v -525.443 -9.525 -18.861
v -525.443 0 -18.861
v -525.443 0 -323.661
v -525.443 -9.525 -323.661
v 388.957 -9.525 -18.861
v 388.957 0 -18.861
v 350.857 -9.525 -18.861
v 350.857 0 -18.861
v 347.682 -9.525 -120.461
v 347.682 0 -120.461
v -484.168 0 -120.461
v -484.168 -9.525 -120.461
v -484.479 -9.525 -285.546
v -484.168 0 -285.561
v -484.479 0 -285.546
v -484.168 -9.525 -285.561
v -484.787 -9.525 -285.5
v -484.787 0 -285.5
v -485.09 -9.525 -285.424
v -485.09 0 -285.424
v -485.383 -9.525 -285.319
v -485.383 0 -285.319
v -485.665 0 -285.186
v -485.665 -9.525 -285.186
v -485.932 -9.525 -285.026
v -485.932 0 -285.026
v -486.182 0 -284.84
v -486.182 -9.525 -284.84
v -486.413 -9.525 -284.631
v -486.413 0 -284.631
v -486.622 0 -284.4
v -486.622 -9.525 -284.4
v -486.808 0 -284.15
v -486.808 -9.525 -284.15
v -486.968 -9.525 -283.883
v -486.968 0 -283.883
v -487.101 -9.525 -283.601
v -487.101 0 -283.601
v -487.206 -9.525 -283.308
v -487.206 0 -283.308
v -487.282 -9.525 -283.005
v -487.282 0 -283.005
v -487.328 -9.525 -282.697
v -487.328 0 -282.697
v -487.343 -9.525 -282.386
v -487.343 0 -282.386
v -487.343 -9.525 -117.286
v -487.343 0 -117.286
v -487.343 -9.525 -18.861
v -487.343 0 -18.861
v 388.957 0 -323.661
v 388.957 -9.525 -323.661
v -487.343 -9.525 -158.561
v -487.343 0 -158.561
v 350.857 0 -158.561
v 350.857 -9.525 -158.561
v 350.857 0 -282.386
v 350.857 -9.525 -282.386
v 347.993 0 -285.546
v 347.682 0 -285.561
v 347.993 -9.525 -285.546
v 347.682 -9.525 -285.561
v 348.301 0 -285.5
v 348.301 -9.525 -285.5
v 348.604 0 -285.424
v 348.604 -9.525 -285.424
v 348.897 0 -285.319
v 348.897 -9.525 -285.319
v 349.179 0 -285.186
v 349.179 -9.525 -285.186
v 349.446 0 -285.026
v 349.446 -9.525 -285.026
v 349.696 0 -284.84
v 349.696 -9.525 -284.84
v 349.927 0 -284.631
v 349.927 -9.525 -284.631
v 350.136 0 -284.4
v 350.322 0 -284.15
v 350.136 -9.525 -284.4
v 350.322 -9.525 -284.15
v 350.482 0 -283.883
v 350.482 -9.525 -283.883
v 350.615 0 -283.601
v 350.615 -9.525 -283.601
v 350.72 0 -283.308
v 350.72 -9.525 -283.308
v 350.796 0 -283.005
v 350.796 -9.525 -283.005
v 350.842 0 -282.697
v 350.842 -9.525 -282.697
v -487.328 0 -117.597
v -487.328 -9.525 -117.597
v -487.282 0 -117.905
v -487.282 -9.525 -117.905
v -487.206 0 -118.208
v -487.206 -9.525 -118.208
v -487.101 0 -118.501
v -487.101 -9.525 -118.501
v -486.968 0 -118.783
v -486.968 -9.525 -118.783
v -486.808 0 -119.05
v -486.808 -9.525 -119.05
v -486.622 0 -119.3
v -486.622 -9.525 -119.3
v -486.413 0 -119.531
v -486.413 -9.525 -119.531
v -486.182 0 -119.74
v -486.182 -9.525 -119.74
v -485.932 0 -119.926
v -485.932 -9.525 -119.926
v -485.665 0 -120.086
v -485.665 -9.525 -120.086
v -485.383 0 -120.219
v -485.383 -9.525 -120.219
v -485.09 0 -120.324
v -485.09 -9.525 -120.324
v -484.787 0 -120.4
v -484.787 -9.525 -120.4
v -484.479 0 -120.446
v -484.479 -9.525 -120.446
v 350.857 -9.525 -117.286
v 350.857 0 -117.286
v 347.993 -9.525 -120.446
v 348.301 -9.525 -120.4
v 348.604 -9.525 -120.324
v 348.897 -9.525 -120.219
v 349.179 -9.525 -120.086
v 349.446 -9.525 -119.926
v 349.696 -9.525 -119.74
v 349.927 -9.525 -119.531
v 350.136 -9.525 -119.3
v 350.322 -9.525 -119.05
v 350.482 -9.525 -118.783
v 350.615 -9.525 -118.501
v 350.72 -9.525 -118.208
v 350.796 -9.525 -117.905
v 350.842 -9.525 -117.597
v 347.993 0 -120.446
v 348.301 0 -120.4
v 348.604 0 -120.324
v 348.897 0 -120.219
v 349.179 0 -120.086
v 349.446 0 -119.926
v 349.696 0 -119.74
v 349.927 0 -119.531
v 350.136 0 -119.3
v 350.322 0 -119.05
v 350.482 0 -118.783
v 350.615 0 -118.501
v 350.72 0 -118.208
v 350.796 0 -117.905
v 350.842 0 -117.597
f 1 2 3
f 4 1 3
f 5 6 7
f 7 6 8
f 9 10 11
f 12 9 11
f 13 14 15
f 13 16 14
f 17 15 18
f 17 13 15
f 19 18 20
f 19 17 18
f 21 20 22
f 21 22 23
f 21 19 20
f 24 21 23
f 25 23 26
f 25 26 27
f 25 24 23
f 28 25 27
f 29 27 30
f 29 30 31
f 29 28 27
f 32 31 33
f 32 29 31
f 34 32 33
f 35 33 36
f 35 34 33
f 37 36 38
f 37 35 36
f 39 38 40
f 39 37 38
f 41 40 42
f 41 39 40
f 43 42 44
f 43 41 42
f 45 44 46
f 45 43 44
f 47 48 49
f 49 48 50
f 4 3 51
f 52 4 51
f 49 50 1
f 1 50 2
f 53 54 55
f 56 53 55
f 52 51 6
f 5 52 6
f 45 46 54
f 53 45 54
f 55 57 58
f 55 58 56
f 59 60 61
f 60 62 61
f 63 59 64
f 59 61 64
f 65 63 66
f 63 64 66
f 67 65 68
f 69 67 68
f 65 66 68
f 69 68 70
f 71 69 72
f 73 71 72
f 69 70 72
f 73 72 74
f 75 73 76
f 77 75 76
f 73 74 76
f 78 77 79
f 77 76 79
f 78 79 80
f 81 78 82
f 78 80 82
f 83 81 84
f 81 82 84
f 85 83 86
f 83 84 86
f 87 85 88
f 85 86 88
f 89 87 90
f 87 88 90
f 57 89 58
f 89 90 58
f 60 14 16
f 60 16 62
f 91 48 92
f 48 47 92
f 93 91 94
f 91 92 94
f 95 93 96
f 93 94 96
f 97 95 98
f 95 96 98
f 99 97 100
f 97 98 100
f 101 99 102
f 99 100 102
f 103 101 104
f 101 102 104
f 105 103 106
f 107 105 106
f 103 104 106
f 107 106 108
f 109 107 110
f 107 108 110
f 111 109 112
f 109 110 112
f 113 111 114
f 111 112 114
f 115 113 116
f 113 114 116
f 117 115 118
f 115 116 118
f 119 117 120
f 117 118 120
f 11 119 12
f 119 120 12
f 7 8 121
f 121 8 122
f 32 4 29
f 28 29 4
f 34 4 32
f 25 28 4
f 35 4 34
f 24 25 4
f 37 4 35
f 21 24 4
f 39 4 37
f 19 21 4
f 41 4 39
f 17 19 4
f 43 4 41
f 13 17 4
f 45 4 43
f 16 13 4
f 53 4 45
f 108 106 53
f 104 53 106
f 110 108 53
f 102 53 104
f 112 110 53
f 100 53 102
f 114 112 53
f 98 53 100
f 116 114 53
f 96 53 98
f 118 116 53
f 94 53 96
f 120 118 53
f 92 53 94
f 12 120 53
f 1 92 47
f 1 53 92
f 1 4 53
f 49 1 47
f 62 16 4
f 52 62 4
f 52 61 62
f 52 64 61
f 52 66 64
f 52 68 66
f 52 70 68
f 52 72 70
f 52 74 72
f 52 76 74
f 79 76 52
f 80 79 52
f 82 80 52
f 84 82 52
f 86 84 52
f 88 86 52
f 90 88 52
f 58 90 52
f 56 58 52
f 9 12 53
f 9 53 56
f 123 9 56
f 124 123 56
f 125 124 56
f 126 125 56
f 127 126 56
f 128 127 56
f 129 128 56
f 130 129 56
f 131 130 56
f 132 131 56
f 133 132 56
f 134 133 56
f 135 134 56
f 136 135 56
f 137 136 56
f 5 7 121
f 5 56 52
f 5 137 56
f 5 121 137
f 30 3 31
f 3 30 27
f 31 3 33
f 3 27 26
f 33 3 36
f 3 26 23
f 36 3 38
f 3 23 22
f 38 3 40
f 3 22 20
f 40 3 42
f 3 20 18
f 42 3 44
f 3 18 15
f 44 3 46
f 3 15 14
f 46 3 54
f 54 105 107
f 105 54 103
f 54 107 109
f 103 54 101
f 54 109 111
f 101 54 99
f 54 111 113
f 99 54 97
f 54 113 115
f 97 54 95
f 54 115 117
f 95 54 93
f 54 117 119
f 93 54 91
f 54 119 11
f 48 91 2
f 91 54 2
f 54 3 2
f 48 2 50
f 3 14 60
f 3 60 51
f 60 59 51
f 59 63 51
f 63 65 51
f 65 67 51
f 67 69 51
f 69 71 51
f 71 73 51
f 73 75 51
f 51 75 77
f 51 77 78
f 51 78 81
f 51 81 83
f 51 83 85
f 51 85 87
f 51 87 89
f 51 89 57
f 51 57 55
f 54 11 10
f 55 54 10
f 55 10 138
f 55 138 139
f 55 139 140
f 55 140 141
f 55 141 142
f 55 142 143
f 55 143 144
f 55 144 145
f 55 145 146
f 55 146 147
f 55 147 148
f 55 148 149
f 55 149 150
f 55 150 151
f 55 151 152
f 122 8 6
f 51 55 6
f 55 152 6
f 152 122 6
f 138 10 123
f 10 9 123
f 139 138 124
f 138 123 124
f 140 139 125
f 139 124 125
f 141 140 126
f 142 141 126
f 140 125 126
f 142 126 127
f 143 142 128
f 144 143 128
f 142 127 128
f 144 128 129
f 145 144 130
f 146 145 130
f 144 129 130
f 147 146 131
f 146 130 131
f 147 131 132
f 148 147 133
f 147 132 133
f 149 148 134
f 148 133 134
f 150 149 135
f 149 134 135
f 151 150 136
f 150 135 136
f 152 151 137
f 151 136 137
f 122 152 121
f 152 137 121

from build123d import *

# Parameters (mm, degrees)
F0_W     = 838.2
F0_H     = 127
F1_DEPTH = 9.525
F2_R     = 3.175


with BuildPart() as f1:
    # F0 (on Front) → F1 (new body)
    with BuildSketch(Plane.XZ):
        Polygon((-487.343022, -18.861064), (-525.443022, -18.861064), (-525.443022, -323.661064), (388.956978, -323.661064), (388.956978, -18.861064), (350.856978, -18.861064), (350.856978, -120.461064), (-487.343022, -120.461064), align=None)
        with Locations((-68.243022, -222.061064)):
            Rectangle(F0_W, F0_H, mode=Mode.SUBTRACT)
    extrude(amount=F1_DEPTH)

    # F2
    f2_edges = [f1.edges().sort_by_distance(p)[0] for p in [
        (-487.343022, -4.7625, -285.561064),
        (350.856978, -4.7625, -285.561064),
        (350.856978, -4.7625, -120.461064),
        (-487.343022, -4.7625, -120.461064),
    ]]
    fillet(f2_edges, radius=F2_R)


solid = f1.part
